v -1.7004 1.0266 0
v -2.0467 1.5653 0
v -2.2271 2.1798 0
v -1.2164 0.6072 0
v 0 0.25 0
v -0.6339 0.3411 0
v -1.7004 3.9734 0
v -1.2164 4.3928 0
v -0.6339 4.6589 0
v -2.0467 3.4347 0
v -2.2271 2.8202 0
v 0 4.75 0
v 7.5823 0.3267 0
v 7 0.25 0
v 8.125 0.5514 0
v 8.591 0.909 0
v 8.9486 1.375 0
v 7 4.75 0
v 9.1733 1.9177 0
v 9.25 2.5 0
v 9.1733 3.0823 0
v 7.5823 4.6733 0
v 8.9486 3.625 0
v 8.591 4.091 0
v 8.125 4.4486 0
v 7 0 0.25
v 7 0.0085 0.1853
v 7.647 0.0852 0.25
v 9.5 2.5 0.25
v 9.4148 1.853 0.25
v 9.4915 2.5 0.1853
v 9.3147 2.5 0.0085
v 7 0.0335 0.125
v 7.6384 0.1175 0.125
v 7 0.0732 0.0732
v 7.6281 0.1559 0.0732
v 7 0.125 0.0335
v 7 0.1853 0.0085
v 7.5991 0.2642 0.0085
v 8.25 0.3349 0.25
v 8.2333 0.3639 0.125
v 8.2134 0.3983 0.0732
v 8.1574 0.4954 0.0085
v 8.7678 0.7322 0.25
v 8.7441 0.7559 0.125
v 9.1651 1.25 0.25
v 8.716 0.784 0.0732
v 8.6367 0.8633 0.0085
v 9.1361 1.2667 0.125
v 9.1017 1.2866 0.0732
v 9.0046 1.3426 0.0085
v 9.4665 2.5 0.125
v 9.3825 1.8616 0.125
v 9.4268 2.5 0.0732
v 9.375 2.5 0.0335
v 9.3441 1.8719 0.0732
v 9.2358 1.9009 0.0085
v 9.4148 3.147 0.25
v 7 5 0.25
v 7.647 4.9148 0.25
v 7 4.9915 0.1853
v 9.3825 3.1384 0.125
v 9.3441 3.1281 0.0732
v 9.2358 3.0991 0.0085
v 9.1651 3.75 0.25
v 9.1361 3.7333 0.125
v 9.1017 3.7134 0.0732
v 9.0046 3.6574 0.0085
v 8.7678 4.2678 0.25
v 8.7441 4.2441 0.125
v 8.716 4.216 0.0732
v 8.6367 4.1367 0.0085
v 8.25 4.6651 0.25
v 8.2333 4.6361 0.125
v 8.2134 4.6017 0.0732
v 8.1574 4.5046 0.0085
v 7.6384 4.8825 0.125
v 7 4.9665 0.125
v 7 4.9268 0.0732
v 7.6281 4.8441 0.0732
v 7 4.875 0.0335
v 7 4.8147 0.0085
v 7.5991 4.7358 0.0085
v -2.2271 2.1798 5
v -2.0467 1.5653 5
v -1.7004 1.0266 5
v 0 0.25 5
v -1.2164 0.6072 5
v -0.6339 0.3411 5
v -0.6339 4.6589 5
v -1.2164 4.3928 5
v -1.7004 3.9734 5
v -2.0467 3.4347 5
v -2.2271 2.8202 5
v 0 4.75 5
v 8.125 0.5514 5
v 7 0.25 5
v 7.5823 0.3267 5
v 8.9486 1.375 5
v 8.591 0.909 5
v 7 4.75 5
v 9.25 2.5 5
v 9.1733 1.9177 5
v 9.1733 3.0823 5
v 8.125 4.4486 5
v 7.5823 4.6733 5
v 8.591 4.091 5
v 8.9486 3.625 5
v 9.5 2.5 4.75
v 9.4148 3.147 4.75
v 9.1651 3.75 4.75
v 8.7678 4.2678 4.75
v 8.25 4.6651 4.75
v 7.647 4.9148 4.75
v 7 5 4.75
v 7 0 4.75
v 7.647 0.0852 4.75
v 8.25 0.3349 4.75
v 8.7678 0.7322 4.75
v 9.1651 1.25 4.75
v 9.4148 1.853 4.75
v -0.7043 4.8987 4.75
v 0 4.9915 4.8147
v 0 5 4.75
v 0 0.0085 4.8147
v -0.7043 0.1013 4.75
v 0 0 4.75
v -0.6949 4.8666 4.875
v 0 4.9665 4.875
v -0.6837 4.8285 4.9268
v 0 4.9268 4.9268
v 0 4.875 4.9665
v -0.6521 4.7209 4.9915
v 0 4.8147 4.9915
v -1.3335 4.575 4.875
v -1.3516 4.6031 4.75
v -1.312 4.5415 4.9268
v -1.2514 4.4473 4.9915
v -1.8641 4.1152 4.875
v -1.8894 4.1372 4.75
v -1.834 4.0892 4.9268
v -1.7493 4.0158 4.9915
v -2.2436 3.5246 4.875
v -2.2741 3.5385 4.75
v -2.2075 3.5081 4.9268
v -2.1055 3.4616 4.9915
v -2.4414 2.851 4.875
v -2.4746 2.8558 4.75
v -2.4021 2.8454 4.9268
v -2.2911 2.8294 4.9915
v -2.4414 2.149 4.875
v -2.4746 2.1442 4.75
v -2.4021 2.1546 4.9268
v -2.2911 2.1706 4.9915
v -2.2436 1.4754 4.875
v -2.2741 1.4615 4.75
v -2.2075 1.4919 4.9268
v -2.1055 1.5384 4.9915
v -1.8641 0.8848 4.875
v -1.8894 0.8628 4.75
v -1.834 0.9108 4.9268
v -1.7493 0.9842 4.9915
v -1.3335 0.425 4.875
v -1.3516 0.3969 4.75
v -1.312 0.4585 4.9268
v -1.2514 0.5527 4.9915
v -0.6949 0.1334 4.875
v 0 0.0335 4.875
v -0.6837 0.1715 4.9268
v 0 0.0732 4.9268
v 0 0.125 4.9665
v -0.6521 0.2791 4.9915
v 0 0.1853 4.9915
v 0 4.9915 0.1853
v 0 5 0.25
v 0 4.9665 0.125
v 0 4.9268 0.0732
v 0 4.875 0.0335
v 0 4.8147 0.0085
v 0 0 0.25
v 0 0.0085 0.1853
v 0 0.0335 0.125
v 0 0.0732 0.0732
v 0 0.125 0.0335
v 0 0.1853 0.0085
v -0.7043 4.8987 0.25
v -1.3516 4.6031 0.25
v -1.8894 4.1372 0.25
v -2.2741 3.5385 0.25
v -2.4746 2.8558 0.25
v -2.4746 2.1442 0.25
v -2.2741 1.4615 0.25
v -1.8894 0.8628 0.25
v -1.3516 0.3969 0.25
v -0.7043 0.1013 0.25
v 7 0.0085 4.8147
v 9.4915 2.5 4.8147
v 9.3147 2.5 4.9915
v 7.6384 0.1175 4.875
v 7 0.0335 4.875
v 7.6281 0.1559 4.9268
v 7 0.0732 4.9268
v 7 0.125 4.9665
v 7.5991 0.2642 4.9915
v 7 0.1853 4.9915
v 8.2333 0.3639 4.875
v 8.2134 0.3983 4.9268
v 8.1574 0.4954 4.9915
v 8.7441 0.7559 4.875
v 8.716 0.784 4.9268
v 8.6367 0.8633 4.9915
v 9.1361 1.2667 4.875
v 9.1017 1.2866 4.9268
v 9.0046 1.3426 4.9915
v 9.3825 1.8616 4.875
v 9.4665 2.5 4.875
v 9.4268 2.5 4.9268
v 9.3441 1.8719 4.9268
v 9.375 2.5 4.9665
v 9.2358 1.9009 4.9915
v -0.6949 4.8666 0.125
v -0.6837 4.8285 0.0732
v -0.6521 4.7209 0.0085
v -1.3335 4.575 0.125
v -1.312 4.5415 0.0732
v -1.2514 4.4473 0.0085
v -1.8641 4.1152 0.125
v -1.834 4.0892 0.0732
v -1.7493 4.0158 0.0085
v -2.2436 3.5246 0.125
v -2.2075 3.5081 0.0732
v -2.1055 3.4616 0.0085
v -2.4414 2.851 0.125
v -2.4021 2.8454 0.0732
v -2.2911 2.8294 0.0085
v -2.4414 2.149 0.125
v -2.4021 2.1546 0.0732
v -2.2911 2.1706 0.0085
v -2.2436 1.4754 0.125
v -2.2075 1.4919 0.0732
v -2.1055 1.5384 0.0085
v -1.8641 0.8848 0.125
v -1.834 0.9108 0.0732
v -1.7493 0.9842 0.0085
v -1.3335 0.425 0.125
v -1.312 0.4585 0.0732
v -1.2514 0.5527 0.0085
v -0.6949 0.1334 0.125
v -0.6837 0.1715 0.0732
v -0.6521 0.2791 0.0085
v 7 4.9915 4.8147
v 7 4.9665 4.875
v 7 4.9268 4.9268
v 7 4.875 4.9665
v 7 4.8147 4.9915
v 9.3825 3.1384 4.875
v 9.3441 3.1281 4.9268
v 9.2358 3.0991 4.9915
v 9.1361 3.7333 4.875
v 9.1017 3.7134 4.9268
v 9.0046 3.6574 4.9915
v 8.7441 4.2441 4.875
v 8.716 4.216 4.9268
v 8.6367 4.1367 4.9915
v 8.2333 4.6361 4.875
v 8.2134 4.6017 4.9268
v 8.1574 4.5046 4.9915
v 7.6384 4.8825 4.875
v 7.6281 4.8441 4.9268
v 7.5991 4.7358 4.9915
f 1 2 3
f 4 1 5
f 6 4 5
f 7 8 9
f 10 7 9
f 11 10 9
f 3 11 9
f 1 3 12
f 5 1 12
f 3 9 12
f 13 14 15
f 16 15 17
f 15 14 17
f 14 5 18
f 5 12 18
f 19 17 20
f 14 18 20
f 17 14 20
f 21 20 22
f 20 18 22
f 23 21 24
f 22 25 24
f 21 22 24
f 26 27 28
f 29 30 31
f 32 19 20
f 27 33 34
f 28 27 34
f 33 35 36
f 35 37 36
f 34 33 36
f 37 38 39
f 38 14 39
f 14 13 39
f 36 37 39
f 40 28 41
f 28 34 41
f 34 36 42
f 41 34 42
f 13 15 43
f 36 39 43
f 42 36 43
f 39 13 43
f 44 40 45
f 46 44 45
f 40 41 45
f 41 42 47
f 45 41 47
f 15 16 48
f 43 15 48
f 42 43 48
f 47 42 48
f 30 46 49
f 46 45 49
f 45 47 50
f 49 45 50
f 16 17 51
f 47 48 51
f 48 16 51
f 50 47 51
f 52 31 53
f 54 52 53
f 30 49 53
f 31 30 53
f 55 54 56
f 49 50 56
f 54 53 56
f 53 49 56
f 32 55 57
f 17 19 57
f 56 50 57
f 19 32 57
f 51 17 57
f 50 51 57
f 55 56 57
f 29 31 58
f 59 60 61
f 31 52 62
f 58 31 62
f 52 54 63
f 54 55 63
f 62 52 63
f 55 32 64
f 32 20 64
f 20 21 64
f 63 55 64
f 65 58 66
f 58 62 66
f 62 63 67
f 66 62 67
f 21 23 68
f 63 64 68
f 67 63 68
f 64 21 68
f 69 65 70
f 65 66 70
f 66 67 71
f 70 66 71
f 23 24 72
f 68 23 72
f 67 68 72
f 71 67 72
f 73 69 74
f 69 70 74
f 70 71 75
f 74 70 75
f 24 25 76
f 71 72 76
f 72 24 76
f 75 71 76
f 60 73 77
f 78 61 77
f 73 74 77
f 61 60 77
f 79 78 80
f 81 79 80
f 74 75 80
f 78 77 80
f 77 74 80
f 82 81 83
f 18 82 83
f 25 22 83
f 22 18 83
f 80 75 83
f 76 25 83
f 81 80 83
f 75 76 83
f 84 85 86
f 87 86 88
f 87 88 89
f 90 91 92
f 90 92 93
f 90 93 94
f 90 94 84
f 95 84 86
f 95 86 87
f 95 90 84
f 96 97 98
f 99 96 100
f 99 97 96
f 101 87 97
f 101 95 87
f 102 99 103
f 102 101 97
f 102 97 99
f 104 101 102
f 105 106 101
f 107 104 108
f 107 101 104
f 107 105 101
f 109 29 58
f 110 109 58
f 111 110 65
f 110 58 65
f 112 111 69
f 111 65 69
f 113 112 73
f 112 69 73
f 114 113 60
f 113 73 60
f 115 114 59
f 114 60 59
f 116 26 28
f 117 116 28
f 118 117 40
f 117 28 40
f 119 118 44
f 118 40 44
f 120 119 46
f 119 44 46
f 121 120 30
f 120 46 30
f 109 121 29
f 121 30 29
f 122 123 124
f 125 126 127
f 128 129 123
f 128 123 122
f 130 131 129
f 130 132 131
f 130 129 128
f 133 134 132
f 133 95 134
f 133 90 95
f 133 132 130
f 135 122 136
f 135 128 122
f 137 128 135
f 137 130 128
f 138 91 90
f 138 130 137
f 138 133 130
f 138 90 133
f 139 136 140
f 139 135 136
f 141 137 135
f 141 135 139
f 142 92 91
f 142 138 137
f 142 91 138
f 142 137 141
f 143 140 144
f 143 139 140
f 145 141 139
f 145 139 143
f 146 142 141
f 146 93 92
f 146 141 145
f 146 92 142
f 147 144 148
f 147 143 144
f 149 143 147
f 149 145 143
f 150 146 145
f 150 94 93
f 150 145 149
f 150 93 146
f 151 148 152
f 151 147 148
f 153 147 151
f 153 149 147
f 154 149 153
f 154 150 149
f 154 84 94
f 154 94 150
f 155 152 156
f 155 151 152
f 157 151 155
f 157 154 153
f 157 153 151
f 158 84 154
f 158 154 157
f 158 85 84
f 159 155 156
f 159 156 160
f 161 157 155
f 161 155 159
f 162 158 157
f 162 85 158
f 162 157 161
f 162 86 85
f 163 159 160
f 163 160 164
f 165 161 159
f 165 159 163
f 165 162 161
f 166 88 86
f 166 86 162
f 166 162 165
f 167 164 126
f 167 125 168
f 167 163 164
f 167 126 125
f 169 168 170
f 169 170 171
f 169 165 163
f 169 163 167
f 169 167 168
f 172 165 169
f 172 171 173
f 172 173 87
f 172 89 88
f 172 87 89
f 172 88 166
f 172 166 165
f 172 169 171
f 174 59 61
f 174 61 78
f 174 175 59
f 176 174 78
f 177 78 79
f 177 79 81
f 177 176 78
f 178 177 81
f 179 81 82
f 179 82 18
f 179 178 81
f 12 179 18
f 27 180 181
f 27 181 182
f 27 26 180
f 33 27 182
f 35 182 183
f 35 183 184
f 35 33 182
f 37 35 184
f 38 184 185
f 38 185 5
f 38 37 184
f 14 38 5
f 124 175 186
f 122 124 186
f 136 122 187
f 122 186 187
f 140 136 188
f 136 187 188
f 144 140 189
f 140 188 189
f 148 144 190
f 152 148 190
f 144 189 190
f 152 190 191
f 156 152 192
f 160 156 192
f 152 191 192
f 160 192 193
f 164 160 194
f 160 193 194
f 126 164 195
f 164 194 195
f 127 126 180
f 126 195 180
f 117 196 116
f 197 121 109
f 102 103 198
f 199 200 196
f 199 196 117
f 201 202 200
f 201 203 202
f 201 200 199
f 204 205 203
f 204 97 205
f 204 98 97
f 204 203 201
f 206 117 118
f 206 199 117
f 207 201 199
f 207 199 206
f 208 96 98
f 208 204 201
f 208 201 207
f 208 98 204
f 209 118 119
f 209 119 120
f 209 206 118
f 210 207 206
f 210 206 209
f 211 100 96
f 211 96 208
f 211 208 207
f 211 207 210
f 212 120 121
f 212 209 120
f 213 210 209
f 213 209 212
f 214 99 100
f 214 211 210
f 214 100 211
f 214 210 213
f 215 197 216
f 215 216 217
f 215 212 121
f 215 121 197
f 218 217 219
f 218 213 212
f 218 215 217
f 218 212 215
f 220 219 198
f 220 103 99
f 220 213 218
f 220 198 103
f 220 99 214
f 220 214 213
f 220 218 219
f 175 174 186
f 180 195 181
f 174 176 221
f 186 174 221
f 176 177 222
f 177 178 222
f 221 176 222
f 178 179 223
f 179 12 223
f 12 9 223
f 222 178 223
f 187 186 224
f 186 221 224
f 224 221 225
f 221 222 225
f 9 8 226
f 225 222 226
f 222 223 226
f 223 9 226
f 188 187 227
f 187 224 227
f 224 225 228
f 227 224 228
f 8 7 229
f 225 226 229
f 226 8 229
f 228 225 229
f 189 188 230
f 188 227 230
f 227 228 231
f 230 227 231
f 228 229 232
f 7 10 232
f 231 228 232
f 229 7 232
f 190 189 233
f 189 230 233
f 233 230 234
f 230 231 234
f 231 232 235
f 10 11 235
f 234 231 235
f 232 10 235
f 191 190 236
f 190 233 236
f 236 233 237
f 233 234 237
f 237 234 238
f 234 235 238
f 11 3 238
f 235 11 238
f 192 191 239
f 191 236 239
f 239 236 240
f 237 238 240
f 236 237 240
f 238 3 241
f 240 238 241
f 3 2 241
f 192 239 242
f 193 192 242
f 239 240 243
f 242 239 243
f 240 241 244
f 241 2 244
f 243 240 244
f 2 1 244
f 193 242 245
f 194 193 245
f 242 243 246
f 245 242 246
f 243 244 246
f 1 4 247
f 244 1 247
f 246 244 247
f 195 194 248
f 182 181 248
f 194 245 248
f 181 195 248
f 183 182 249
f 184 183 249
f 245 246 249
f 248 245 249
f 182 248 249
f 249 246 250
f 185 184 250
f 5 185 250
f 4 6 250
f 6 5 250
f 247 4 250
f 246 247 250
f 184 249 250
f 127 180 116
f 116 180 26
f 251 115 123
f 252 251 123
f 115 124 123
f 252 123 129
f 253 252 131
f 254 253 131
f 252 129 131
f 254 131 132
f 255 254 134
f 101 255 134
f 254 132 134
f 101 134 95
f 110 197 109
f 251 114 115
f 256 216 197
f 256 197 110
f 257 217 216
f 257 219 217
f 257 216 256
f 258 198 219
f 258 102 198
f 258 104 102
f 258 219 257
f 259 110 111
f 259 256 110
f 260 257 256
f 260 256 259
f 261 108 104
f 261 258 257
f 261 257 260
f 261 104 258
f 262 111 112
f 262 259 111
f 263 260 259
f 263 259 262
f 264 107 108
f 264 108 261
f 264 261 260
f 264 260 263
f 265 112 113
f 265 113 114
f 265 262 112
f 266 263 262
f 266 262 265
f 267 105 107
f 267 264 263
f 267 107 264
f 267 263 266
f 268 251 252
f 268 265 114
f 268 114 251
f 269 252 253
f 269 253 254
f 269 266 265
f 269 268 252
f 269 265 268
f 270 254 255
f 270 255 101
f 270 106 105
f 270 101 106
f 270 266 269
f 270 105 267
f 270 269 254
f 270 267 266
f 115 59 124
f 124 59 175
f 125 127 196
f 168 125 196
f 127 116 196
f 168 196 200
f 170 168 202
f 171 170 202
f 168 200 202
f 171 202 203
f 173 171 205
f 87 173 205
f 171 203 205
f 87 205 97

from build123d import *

# Parameters (mm, degrees)
BOSS_EXTRUDE1_DEPTH = 5
FILLET1_R           = 0.25


with BuildPart() as part:
    # Sketch1 → Boss-Extrude1 (new body)
    with BuildSketch(Plane.XY):
        with BuildLine():
            ThreePointArc((0, 5), (-2.5, 2.5), (0, 0))
            Line((0, 0), (0, 5))
        make_face()
        with BuildLine():
            Line((0, 5), (0, 0))
            ThreePointArc((0, 0), (1.767766953, 0.732233047), (2.5, 2.5))
            ThreePointArc((2.5, 2.5), (1.767766953, 4.267766953), (0, 5))
        make_face()
        with BuildLine():
            ThreePointArc((2.5, 2.5), (1.767766953, 0.732233047), (0, 0))
            Line((0, 0), (7, 0))
            ThreePointArc((7, 0), (4.5, 2.5), (7, 5))
            Line((7, 5), (0, 5))
            ThreePointArc((0, 5), (1.767766953, 4.267766953), (2.5, 2.5))
        make_face()
        with BuildLine():
            ThreePointArc((7, 5), (4.5, 2.5), (7, 0))
            Line((7, 0), (7, 5))
        make_face()
        with BuildLine():
            Line((7, 5), (7, 0))
            ThreePointArc((7, 0), (8.767766953, 0.732233047), (9.5, 2.5))
            ThreePointArc((9.5, 2.5), (8.767766953, 4.267766953), (7, 5))
        make_face()
    extrude(amount=BOSS_EXTRUDE1_DEPTH)

    # Fillet1
    fillet1_edges = [part.edges().sort_by_distance(p)[0] for p in [
        (3.5, 0, 5),
        (9.5, 2.5, 5),
        (3.5, 5, 5),
        (-2.5, 2.5, 5),
        (3.5, 5, 0),
        (9.5, 2.5, 0),
        (3.5, 0, 0),
        (-2.5, 2.5, 0),
    ]]
    fillet(fillet1_edges, radius=FILLET1_R)


solid = part.part
